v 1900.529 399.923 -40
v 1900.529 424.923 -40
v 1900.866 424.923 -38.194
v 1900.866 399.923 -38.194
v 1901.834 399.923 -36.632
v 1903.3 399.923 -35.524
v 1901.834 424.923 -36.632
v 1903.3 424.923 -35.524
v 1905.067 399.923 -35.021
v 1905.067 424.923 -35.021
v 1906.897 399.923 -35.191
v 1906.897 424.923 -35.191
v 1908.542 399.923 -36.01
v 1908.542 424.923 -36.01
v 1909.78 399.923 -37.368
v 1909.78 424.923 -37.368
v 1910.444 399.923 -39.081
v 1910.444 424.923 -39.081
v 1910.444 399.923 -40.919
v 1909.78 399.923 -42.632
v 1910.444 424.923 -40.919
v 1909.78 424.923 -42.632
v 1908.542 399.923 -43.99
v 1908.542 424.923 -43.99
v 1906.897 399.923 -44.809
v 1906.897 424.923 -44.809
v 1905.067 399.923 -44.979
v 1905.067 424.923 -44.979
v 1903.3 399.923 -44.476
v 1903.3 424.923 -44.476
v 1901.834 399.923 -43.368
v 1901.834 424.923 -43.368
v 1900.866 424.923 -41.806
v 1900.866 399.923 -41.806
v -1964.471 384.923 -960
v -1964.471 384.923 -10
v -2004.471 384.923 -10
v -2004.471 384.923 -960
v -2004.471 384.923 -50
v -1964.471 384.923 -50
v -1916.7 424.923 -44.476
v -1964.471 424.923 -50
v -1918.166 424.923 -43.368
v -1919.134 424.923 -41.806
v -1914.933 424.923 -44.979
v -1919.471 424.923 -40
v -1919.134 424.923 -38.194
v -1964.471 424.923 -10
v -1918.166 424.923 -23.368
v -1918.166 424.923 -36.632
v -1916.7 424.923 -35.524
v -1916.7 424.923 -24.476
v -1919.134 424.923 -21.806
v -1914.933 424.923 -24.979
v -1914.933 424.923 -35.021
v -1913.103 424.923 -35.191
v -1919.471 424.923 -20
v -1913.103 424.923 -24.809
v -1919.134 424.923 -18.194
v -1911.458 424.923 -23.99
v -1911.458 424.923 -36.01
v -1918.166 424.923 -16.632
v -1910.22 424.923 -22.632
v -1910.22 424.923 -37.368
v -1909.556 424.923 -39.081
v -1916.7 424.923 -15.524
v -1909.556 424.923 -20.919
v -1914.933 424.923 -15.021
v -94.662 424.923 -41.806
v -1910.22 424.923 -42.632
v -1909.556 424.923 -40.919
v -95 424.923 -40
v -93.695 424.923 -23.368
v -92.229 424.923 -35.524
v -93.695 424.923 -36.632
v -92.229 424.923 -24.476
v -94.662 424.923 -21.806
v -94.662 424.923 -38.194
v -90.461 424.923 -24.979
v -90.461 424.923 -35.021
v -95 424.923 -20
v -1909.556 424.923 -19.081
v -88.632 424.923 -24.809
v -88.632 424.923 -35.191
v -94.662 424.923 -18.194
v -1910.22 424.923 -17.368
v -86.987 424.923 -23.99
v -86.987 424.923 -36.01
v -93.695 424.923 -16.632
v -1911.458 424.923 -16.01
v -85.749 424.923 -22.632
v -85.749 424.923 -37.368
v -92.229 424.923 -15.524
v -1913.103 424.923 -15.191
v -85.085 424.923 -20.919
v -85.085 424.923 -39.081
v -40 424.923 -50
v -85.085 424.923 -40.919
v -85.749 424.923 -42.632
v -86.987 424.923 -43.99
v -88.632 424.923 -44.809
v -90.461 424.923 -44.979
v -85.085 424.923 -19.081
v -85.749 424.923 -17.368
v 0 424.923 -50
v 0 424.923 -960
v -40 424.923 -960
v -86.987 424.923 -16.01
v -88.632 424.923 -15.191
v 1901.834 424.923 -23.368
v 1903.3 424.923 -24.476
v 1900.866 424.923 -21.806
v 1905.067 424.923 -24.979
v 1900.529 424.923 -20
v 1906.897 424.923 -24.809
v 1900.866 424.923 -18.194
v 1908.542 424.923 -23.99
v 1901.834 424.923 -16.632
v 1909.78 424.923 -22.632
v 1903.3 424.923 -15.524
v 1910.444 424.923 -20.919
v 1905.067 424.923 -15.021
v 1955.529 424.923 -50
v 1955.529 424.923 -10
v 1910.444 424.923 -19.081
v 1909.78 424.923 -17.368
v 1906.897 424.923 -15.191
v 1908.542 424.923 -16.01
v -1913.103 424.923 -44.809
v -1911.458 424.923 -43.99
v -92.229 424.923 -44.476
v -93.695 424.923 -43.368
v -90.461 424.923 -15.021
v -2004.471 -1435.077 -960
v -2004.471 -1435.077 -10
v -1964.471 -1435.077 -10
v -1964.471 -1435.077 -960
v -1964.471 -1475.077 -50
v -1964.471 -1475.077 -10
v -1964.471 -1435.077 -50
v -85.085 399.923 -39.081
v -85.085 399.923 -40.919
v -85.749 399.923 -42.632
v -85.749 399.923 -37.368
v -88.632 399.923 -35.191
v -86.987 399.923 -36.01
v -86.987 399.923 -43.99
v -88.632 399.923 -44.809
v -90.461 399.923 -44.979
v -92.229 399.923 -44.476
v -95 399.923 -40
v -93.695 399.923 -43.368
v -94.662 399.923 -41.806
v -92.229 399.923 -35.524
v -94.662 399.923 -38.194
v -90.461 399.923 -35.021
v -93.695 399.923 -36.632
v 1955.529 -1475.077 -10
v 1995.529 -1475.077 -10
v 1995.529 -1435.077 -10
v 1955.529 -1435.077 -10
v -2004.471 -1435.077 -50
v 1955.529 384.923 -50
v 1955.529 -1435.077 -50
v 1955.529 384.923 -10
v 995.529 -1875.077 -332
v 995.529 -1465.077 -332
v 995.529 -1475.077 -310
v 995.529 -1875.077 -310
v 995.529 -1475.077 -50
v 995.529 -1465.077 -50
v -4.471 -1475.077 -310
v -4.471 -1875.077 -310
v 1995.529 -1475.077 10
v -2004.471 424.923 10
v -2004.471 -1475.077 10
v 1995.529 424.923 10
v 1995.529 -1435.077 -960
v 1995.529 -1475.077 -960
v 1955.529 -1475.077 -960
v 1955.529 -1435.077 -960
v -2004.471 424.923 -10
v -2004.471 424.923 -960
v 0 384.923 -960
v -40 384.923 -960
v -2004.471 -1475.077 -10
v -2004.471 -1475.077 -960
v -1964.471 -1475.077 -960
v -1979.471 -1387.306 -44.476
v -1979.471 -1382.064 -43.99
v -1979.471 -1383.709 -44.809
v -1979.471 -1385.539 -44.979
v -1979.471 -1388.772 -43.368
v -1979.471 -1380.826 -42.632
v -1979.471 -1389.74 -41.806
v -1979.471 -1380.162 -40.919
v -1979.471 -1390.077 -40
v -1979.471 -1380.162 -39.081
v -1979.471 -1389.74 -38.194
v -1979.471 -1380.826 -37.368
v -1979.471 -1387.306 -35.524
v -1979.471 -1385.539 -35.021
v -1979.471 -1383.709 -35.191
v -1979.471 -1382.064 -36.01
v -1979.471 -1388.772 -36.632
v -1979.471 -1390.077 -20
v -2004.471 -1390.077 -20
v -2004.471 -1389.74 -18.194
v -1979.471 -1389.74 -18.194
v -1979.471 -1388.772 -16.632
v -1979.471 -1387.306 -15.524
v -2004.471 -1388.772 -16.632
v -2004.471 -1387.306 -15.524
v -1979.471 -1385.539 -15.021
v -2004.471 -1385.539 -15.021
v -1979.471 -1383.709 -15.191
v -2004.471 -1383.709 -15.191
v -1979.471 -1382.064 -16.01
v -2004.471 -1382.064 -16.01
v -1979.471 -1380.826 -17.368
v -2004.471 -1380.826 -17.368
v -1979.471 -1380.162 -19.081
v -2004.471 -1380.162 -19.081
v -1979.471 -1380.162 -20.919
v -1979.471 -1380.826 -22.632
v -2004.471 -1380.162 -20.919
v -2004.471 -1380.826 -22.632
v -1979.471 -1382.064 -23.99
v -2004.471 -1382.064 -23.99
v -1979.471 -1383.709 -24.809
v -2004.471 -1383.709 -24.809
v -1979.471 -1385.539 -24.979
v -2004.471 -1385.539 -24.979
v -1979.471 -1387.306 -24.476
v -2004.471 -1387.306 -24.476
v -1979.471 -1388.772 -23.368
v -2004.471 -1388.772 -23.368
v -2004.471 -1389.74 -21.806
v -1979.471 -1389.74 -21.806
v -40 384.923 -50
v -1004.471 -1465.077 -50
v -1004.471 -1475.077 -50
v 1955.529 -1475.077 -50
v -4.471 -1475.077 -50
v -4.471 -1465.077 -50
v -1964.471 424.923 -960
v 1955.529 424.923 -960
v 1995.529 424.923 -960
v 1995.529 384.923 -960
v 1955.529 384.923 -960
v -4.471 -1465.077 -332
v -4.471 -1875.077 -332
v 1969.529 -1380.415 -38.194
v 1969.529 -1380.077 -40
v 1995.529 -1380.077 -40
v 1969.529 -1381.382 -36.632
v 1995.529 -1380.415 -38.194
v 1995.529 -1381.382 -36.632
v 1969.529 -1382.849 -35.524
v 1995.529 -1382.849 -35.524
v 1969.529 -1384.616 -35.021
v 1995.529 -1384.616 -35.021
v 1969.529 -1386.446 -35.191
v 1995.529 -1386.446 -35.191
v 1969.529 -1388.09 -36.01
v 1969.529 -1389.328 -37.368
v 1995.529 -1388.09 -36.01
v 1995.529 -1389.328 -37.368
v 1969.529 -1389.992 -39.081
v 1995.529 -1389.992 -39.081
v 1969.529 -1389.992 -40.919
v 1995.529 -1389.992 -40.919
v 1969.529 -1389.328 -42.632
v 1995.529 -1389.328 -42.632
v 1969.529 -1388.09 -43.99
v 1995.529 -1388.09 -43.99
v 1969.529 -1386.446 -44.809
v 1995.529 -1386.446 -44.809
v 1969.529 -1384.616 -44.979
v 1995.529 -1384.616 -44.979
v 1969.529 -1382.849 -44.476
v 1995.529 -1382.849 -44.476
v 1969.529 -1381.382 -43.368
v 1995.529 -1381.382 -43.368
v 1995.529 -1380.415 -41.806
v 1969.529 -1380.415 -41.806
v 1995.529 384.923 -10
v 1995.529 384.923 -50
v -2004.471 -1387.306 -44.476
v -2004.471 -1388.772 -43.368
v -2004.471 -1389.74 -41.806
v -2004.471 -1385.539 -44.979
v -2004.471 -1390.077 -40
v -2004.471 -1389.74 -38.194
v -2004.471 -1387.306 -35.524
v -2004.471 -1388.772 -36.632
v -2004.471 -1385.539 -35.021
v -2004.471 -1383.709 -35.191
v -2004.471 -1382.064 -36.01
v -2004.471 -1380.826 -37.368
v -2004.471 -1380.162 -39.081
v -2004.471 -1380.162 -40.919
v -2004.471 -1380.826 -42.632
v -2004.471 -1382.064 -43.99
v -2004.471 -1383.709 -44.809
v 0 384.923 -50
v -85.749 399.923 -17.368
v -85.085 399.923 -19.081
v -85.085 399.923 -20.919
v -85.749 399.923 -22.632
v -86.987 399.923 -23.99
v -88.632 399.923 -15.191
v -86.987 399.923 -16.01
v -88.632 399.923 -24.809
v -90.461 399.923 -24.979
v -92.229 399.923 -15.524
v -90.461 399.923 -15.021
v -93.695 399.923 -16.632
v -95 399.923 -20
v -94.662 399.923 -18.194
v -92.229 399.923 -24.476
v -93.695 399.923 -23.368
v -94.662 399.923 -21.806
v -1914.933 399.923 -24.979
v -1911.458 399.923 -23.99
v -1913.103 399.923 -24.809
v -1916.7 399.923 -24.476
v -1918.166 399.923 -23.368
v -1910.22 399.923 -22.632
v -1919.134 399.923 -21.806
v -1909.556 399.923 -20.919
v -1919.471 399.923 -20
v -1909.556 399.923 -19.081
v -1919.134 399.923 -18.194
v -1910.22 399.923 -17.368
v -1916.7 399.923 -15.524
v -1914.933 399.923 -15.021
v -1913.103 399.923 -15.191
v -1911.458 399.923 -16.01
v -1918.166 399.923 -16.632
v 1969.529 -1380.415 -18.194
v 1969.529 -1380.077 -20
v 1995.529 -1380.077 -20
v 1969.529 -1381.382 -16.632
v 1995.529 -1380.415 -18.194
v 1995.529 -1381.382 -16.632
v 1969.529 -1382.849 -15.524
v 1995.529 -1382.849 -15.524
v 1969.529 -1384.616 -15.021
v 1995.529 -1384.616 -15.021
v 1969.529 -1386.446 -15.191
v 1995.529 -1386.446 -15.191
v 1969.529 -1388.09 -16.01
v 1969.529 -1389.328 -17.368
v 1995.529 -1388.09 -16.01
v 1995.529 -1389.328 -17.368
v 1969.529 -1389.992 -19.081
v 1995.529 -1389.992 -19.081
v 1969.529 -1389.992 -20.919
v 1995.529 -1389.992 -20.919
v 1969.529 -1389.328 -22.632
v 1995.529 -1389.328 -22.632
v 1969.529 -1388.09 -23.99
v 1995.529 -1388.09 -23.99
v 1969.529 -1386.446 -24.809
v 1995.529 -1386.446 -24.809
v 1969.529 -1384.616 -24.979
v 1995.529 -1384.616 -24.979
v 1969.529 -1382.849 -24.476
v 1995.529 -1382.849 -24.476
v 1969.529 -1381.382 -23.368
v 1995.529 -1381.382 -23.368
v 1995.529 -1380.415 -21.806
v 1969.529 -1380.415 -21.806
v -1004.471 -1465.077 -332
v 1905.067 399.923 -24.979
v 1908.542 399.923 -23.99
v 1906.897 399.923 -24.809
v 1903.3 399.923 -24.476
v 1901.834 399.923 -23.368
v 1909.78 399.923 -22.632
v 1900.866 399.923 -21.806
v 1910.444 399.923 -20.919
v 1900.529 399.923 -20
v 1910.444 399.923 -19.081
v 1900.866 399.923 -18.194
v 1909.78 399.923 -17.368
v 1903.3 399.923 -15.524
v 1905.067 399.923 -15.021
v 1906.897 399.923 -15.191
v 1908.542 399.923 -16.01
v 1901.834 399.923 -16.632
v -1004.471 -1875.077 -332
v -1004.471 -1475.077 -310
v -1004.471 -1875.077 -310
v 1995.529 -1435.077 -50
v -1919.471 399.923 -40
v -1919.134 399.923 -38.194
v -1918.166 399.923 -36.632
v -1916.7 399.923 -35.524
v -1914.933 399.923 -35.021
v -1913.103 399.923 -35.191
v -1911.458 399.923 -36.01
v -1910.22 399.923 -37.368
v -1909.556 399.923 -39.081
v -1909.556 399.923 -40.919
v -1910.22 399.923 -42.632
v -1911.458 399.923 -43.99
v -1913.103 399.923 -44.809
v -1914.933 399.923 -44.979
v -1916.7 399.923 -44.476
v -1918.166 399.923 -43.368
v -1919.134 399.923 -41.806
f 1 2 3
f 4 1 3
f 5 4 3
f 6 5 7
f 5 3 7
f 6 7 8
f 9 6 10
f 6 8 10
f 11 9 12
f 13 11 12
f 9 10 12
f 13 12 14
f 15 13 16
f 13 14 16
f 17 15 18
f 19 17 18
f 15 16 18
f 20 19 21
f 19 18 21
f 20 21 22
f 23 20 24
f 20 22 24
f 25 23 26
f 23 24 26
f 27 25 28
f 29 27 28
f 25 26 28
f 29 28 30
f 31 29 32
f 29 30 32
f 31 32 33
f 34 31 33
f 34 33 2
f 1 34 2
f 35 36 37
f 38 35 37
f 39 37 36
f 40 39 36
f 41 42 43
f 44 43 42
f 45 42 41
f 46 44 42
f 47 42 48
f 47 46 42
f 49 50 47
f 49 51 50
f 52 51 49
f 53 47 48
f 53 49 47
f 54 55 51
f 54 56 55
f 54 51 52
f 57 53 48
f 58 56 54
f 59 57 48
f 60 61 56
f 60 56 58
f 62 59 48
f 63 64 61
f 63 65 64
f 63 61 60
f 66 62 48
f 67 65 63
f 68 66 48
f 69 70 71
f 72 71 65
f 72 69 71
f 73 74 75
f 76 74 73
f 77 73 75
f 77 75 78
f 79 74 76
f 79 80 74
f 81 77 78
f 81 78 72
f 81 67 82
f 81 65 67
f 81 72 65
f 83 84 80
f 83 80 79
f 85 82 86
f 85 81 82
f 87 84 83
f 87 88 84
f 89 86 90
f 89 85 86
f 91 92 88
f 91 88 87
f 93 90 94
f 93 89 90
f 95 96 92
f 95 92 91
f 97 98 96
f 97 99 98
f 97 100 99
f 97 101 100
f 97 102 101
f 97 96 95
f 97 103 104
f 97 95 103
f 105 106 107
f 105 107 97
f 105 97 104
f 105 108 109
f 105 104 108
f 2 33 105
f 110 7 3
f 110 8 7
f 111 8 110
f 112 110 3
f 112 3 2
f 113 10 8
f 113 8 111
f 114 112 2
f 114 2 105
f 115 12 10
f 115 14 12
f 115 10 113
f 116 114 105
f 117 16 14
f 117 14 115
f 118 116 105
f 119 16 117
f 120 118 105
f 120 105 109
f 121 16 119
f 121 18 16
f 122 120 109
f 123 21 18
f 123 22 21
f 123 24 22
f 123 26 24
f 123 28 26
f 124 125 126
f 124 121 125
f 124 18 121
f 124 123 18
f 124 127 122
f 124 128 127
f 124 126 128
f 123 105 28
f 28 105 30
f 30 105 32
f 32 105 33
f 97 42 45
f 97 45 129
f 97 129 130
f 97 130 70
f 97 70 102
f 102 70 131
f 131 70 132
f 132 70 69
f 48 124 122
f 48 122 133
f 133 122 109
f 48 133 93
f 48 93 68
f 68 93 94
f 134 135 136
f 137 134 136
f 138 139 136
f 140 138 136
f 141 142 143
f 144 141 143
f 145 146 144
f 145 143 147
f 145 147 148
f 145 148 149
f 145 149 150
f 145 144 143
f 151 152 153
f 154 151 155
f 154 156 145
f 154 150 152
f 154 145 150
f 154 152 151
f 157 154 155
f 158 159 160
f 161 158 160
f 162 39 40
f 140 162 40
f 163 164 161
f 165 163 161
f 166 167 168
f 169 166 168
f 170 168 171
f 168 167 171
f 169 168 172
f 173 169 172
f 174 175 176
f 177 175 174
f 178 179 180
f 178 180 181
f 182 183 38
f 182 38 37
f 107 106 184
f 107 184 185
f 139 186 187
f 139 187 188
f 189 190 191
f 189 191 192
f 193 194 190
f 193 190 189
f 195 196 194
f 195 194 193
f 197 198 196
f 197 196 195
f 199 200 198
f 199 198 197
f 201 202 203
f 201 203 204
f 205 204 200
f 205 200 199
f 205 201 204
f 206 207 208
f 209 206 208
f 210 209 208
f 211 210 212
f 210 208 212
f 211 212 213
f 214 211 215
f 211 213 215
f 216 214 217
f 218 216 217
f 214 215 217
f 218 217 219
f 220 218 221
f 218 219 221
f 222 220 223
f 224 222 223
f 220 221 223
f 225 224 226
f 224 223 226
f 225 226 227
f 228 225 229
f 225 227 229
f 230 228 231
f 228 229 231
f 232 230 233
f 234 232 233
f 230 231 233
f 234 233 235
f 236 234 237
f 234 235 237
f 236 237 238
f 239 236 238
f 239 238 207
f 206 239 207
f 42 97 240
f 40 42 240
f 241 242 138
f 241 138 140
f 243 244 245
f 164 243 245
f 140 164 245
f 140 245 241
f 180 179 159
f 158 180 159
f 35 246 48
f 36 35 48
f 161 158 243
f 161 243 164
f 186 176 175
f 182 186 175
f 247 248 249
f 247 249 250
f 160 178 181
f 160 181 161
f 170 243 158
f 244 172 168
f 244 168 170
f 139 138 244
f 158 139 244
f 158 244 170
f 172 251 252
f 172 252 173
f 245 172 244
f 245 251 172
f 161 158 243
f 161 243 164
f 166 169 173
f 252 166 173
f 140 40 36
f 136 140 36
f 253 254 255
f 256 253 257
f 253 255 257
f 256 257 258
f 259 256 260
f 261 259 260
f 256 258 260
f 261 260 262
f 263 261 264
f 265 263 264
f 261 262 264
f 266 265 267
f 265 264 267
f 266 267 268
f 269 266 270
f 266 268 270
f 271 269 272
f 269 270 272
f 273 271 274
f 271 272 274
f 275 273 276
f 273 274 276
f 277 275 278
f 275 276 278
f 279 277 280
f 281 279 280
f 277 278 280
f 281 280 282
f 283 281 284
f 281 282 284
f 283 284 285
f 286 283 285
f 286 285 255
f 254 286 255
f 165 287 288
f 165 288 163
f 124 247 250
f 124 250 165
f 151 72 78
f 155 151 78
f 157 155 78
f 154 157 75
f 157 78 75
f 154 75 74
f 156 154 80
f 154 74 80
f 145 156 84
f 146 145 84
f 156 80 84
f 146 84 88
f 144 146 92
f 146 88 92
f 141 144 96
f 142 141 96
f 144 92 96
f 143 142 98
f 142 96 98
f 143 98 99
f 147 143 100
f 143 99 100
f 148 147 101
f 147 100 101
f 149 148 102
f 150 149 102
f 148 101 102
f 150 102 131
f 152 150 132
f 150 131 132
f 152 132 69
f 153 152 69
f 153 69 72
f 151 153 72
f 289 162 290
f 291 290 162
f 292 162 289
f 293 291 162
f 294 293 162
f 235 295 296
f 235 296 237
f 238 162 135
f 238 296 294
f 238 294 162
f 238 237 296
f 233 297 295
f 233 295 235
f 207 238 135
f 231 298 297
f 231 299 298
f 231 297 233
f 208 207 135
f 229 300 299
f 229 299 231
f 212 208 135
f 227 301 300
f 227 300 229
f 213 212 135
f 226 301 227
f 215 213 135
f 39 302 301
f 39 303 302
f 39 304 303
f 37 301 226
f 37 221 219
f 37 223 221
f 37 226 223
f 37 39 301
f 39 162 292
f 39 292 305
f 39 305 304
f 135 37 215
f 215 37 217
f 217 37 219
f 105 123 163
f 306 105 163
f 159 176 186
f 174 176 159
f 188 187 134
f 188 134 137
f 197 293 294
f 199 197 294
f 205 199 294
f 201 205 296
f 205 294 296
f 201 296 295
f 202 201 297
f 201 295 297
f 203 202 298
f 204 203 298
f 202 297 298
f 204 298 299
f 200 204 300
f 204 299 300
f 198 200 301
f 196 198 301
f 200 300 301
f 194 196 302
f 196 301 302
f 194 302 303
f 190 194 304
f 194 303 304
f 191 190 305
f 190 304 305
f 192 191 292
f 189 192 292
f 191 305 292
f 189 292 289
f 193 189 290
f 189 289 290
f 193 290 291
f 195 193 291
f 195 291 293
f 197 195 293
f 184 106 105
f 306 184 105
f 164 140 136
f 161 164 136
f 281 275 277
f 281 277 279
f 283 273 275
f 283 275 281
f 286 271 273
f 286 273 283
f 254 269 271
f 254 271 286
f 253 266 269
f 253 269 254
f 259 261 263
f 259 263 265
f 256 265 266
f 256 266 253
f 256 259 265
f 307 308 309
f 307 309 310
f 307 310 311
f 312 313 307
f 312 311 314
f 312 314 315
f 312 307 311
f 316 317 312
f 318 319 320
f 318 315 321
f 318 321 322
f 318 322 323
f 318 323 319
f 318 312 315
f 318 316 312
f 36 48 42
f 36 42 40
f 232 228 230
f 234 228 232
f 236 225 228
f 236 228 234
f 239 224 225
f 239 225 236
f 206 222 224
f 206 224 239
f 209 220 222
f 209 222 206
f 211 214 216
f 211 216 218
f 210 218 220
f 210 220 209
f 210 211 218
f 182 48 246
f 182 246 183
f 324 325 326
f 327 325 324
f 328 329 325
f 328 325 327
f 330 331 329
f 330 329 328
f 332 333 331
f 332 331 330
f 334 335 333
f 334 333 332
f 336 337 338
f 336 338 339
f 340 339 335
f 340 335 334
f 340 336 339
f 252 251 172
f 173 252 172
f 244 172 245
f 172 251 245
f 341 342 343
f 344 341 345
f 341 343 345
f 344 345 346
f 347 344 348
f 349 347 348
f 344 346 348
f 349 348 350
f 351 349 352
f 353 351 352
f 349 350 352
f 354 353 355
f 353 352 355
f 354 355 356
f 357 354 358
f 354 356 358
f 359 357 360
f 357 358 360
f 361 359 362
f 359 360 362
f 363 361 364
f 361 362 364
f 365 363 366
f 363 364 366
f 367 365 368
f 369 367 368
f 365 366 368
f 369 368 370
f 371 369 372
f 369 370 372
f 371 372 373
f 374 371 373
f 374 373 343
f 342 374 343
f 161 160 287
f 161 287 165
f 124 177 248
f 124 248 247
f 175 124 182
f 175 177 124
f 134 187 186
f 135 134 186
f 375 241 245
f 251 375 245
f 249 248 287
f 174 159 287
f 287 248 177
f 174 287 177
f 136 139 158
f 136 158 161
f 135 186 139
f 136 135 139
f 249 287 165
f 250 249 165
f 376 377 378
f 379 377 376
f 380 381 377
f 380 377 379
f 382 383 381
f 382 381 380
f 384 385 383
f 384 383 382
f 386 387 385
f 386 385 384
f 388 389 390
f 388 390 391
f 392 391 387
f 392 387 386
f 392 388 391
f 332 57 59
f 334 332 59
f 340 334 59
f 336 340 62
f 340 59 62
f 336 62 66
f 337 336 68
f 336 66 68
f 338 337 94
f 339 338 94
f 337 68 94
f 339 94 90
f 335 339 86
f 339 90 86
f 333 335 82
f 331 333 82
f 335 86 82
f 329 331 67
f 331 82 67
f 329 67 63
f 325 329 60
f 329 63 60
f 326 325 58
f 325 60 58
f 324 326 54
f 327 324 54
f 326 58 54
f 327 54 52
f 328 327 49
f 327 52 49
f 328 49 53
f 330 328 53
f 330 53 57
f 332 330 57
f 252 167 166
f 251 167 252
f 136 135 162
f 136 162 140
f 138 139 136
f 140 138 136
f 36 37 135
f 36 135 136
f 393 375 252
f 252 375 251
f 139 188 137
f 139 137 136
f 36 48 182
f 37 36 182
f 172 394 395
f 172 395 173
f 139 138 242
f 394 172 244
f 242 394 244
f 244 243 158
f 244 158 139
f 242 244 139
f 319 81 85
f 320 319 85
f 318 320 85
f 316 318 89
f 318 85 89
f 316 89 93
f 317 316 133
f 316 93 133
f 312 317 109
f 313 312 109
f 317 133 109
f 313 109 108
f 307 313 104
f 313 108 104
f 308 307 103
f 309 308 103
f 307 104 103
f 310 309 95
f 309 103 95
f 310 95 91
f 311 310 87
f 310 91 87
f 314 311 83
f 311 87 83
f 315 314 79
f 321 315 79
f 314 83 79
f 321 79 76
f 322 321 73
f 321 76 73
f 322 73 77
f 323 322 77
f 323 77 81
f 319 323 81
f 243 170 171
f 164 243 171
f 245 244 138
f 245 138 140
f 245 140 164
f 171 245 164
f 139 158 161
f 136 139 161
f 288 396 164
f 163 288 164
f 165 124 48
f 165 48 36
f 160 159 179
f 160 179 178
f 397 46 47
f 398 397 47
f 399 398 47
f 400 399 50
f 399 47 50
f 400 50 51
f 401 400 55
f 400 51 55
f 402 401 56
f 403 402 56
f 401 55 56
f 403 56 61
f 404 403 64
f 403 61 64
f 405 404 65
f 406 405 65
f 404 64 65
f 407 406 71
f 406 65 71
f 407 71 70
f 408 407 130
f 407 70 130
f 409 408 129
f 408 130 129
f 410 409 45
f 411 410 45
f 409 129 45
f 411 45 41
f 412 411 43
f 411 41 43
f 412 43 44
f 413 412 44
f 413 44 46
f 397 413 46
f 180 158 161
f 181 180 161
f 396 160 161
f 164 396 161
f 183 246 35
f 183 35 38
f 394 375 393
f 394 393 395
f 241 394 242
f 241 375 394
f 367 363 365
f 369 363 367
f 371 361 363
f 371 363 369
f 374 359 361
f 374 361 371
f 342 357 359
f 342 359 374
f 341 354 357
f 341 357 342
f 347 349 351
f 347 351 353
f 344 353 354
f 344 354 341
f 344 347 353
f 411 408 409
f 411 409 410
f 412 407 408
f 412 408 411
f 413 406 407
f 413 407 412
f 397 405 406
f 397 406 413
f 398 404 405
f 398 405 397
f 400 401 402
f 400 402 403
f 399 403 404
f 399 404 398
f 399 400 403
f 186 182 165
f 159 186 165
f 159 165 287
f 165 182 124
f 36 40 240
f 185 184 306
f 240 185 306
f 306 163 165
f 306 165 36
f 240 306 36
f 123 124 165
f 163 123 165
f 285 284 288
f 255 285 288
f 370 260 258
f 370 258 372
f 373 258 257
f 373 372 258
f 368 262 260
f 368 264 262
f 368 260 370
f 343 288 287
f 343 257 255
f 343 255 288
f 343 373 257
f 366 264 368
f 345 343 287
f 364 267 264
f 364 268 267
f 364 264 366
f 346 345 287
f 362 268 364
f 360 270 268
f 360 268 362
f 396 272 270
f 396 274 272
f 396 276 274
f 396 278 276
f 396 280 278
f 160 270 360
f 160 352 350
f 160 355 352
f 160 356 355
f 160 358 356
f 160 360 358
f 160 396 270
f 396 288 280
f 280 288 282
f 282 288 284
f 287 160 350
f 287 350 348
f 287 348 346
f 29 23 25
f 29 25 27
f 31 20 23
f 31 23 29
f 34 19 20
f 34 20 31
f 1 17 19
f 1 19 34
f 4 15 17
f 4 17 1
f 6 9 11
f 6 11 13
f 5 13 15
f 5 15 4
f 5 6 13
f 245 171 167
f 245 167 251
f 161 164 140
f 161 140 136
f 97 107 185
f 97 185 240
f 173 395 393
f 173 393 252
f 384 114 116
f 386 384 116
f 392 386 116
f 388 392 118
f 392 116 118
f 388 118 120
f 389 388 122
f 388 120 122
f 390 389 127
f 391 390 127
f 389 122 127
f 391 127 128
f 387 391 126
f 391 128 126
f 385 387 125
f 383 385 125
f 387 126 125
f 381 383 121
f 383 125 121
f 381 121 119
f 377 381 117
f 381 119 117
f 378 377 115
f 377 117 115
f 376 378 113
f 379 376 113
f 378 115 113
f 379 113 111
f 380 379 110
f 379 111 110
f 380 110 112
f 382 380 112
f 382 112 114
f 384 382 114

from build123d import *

# Parameters (mm, degrees)
F0_W      = 4000
F0_H      = 1900
F1_DEPTH  = 10
F2_W      = 40
F2_H      = 950
F3_DEPTH  = 40
F4_W      = 40
F4_H      = 950
F5_DEPTH  = 40
F6_W      = 40
F6_H      = 950
F7_DEPTH  = 40
F8_W      = 40
F8_H      = 950
F9_DEPTH  = 40
F10_W     = 40
F10_H     = 40
F11_DEPTH = 3920
F12_W     = 40
F12_H     = 40
F13_DEPTH = 3920
F14_W     = 40
F14_H     = 40
F15_DEPTH = 1820
F16_W     = 40
F16_H     = 40
F17_DEPTH = 1820
F18_W     = 1000
F18_H     = 260
F19_DEPTH = 10
F20_W     = 40
F20_H     = 910
F21_DEPTH = 40
F22_W     = 1000
F22_H     = 22
F23_DEPTH = 410
F25_R     = 5
F26_DEPTH = 26
F27_R     = 5
F28_DEPTH = 25
F29_R     = 5
F30_DEPTH = 25
F31_R     = 5
F32_DEPTH = 25
F33_R     = 5
F34_DEPTH = 25


with BuildPart() as f1:
    # F0 (on Top) → F1 (new body, symmetric)
    with BuildSketch(Plane.XY):
        with Locations((-4.471272, -525.077287)):
            Rectangle(F0_W, F0_H)
    extrude(amount=F1_DEPTH, both=True)

    # F4 (on face) → F5 (join)
    with BuildSketch(Plane(origin=(0, 424.922713, 0), x_dir=(-1, 0, 0), z_dir=(0, 1, 0))):
        with Locations((-1975.528728, -485)):
            Rectangle(F4_W, F4_H)
    extrude(amount=-F5_DEPTH)


with BuildPart() as f3:
    # F2 (on face) → F3 (new body)
    with BuildSketch(Plane.XZ.offset(1475.077287)):
        with Locations((-1984.471272, -485)):
            Rectangle(F2_W, F2_H)
    extrude(amount=-F3_DEPTH)


with BuildPart() as f7:
    # F6 (on face) → F7 (new body)
    with BuildSketch(Plane.YZ.offset(1995.528728)):
        with Locations((-1455.077287, -485)):
            Rectangle(F6_W, F6_H)
    extrude(amount=-F7_DEPTH)


with BuildPart() as f9:
    # F8 (on face) → F9 (new body)
    with BuildSketch(Plane(origin=(0, 424.922713, 0), x_dir=(-1, 0, 0), z_dir=(0, 1, 0))):
        with Locations((1984.471272, -485)):
            Rectangle(F8_W, F8_H)
    extrude(amount=-F9_DEPTH)


with BuildPart() as f11:
    # F10 (on face) → F11 (new body, through all)
    with BuildSketch(Plane.YZ.offset(-1964.471272)):
        with Locations((-1455.077287, -30)):
            Rectangle(F10_W, F10_H)
    extrude(amount=F11_DEPTH)

    # F18 (on face) → F19 (join)
    with BuildSketch(Plane.XZ.offset(1475.077287)):
        with Locations((495.528728, -180)):
            Rectangle(F18_W, F18_H)
    extrude(amount=-F19_DEPTH)

    # F22 (on face) → F23 (join)
    with BuildSketch(Plane(origin=(0, -1465.077287, 0), x_dir=(-1, 0, 0), z_dir=(0, 1, 0))):
        with Locations((-495.528728, -321)):
            Rectangle(F22_W, F22_H)
    extrude(amount=-F23_DEPTH)


with BuildPart() as f13:
    # F12 (on face) → F13 (new body, through all)
    with BuildSketch(Plane(origin=(1955.528728, 0, 0), x_dir=(0, -1, 0), z_dir=(-1, 0, 0))):
        with Locations((-404.922713, -30)):
            Rectangle(F12_W, F12_H)
    extrude(amount=F13_DEPTH)

    # F20 (on face) → F21 (join)
    with BuildSketch(Plane(origin=(0, 424.922713, 0), x_dir=(-1, 0, 0), z_dir=(0, 1, 0))):
        with Locations((20, -505)):
            Rectangle(F20_W, F20_H)
    extrude(amount=-F21_DEPTH)

    # F29 (on face) → F30 (cut)
    with BuildSketch(Plane(origin=(0, 424.922713, 0), x_dir=(-1, 0, 0), z_dir=(0, 1, 0))):
        with Locations((1914.471272, -20)):
            Circle(F29_R)
        with Locations((1914.471272, -40)):
            Circle(F29_R)
    extrude(amount=-F30_DEPTH, mode=Mode.SUBTRACT)

    # F31 (on face) → F32 (cut)
    with BuildSketch(Plane(origin=(0, 424.922713, 0), x_dir=(-1, 0, 0), z_dir=(0, 1, 0))):
        with Locations((90, -20)):
            Circle(F31_R)
        with Locations((90, -40)):
            Circle(F31_R)
    extrude(amount=-F32_DEPTH, mode=Mode.SUBTRACT)

    # F33 (on face) → F34 (cut)
    with BuildSketch(Plane(origin=(0, 424.922713, 0), x_dir=(-1, 0, 0), z_dir=(0, 1, 0))):
        with Locations((-1905.528728, -20)):
            Circle(F33_R)
        with Locations((-1905.528728, -40)):
            Circle(F33_R)
    extrude(amount=-F34_DEPTH, mode=Mode.SUBTRACT)


with BuildPart() as f15:
    # F14 (on face) → F15 (new body, through all)
    with BuildSketch(Plane.XZ.offset(-384.922713)):
        with Locations((-1984.471272, -30)):
            Rectangle(F14_W, F14_H)
    extrude(amount=F15_DEPTH)

    # F27 (on face) → F28 (cut)
    with BuildSketch(Plane(origin=(-2004.471272, 0, 0), x_dir=(0, -1, 0), z_dir=(-1, 0, 0))):
        with Locations((1385.077287, -20)):
            Circle(F27_R)
        with Locations((1385.077287, -40)):
            Circle(F27_R)
    extrude(amount=-F28_DEPTH, mode=Mode.SUBTRACT)


with BuildPart() as f17:
    # F16 (on face) → F17 (new body, through all)
    with BuildSketch(Plane(origin=(0, -1435.077287, 0), x_dir=(-1, 0, 0), z_dir=(0, 1, 0))):
        with Locations((-1975.528728, -30)):
            Rectangle(F16_W, F16_H)
    extrude(amount=F17_DEPTH)

    # F25 (on face) → F26 (cut)
    with BuildSketch(Plane.YZ.offset(1995.528728)):
        with Locations((-1385.077287, -20)):
            Circle(F25_R)
        with Locations((-1385.077287, -40)):
            Circle(F25_R)
    extrude(amount=-F26_DEPTH, mode=Mode.SUBTRACT)


with BuildPart() as f24_1:
    # F24: instance of F11
    add(f11.part.mirror(Plane(origin=(-4.471272, -1625.326857, -289.450947), x_dir=(0, -1, 0), z_dir=(-1, 0, 0))))


solid = Compound([f1.part, f3.part, f7.part, f9.part, f11.part, f13.part, f15.part, f17.part, f24_1.part])
